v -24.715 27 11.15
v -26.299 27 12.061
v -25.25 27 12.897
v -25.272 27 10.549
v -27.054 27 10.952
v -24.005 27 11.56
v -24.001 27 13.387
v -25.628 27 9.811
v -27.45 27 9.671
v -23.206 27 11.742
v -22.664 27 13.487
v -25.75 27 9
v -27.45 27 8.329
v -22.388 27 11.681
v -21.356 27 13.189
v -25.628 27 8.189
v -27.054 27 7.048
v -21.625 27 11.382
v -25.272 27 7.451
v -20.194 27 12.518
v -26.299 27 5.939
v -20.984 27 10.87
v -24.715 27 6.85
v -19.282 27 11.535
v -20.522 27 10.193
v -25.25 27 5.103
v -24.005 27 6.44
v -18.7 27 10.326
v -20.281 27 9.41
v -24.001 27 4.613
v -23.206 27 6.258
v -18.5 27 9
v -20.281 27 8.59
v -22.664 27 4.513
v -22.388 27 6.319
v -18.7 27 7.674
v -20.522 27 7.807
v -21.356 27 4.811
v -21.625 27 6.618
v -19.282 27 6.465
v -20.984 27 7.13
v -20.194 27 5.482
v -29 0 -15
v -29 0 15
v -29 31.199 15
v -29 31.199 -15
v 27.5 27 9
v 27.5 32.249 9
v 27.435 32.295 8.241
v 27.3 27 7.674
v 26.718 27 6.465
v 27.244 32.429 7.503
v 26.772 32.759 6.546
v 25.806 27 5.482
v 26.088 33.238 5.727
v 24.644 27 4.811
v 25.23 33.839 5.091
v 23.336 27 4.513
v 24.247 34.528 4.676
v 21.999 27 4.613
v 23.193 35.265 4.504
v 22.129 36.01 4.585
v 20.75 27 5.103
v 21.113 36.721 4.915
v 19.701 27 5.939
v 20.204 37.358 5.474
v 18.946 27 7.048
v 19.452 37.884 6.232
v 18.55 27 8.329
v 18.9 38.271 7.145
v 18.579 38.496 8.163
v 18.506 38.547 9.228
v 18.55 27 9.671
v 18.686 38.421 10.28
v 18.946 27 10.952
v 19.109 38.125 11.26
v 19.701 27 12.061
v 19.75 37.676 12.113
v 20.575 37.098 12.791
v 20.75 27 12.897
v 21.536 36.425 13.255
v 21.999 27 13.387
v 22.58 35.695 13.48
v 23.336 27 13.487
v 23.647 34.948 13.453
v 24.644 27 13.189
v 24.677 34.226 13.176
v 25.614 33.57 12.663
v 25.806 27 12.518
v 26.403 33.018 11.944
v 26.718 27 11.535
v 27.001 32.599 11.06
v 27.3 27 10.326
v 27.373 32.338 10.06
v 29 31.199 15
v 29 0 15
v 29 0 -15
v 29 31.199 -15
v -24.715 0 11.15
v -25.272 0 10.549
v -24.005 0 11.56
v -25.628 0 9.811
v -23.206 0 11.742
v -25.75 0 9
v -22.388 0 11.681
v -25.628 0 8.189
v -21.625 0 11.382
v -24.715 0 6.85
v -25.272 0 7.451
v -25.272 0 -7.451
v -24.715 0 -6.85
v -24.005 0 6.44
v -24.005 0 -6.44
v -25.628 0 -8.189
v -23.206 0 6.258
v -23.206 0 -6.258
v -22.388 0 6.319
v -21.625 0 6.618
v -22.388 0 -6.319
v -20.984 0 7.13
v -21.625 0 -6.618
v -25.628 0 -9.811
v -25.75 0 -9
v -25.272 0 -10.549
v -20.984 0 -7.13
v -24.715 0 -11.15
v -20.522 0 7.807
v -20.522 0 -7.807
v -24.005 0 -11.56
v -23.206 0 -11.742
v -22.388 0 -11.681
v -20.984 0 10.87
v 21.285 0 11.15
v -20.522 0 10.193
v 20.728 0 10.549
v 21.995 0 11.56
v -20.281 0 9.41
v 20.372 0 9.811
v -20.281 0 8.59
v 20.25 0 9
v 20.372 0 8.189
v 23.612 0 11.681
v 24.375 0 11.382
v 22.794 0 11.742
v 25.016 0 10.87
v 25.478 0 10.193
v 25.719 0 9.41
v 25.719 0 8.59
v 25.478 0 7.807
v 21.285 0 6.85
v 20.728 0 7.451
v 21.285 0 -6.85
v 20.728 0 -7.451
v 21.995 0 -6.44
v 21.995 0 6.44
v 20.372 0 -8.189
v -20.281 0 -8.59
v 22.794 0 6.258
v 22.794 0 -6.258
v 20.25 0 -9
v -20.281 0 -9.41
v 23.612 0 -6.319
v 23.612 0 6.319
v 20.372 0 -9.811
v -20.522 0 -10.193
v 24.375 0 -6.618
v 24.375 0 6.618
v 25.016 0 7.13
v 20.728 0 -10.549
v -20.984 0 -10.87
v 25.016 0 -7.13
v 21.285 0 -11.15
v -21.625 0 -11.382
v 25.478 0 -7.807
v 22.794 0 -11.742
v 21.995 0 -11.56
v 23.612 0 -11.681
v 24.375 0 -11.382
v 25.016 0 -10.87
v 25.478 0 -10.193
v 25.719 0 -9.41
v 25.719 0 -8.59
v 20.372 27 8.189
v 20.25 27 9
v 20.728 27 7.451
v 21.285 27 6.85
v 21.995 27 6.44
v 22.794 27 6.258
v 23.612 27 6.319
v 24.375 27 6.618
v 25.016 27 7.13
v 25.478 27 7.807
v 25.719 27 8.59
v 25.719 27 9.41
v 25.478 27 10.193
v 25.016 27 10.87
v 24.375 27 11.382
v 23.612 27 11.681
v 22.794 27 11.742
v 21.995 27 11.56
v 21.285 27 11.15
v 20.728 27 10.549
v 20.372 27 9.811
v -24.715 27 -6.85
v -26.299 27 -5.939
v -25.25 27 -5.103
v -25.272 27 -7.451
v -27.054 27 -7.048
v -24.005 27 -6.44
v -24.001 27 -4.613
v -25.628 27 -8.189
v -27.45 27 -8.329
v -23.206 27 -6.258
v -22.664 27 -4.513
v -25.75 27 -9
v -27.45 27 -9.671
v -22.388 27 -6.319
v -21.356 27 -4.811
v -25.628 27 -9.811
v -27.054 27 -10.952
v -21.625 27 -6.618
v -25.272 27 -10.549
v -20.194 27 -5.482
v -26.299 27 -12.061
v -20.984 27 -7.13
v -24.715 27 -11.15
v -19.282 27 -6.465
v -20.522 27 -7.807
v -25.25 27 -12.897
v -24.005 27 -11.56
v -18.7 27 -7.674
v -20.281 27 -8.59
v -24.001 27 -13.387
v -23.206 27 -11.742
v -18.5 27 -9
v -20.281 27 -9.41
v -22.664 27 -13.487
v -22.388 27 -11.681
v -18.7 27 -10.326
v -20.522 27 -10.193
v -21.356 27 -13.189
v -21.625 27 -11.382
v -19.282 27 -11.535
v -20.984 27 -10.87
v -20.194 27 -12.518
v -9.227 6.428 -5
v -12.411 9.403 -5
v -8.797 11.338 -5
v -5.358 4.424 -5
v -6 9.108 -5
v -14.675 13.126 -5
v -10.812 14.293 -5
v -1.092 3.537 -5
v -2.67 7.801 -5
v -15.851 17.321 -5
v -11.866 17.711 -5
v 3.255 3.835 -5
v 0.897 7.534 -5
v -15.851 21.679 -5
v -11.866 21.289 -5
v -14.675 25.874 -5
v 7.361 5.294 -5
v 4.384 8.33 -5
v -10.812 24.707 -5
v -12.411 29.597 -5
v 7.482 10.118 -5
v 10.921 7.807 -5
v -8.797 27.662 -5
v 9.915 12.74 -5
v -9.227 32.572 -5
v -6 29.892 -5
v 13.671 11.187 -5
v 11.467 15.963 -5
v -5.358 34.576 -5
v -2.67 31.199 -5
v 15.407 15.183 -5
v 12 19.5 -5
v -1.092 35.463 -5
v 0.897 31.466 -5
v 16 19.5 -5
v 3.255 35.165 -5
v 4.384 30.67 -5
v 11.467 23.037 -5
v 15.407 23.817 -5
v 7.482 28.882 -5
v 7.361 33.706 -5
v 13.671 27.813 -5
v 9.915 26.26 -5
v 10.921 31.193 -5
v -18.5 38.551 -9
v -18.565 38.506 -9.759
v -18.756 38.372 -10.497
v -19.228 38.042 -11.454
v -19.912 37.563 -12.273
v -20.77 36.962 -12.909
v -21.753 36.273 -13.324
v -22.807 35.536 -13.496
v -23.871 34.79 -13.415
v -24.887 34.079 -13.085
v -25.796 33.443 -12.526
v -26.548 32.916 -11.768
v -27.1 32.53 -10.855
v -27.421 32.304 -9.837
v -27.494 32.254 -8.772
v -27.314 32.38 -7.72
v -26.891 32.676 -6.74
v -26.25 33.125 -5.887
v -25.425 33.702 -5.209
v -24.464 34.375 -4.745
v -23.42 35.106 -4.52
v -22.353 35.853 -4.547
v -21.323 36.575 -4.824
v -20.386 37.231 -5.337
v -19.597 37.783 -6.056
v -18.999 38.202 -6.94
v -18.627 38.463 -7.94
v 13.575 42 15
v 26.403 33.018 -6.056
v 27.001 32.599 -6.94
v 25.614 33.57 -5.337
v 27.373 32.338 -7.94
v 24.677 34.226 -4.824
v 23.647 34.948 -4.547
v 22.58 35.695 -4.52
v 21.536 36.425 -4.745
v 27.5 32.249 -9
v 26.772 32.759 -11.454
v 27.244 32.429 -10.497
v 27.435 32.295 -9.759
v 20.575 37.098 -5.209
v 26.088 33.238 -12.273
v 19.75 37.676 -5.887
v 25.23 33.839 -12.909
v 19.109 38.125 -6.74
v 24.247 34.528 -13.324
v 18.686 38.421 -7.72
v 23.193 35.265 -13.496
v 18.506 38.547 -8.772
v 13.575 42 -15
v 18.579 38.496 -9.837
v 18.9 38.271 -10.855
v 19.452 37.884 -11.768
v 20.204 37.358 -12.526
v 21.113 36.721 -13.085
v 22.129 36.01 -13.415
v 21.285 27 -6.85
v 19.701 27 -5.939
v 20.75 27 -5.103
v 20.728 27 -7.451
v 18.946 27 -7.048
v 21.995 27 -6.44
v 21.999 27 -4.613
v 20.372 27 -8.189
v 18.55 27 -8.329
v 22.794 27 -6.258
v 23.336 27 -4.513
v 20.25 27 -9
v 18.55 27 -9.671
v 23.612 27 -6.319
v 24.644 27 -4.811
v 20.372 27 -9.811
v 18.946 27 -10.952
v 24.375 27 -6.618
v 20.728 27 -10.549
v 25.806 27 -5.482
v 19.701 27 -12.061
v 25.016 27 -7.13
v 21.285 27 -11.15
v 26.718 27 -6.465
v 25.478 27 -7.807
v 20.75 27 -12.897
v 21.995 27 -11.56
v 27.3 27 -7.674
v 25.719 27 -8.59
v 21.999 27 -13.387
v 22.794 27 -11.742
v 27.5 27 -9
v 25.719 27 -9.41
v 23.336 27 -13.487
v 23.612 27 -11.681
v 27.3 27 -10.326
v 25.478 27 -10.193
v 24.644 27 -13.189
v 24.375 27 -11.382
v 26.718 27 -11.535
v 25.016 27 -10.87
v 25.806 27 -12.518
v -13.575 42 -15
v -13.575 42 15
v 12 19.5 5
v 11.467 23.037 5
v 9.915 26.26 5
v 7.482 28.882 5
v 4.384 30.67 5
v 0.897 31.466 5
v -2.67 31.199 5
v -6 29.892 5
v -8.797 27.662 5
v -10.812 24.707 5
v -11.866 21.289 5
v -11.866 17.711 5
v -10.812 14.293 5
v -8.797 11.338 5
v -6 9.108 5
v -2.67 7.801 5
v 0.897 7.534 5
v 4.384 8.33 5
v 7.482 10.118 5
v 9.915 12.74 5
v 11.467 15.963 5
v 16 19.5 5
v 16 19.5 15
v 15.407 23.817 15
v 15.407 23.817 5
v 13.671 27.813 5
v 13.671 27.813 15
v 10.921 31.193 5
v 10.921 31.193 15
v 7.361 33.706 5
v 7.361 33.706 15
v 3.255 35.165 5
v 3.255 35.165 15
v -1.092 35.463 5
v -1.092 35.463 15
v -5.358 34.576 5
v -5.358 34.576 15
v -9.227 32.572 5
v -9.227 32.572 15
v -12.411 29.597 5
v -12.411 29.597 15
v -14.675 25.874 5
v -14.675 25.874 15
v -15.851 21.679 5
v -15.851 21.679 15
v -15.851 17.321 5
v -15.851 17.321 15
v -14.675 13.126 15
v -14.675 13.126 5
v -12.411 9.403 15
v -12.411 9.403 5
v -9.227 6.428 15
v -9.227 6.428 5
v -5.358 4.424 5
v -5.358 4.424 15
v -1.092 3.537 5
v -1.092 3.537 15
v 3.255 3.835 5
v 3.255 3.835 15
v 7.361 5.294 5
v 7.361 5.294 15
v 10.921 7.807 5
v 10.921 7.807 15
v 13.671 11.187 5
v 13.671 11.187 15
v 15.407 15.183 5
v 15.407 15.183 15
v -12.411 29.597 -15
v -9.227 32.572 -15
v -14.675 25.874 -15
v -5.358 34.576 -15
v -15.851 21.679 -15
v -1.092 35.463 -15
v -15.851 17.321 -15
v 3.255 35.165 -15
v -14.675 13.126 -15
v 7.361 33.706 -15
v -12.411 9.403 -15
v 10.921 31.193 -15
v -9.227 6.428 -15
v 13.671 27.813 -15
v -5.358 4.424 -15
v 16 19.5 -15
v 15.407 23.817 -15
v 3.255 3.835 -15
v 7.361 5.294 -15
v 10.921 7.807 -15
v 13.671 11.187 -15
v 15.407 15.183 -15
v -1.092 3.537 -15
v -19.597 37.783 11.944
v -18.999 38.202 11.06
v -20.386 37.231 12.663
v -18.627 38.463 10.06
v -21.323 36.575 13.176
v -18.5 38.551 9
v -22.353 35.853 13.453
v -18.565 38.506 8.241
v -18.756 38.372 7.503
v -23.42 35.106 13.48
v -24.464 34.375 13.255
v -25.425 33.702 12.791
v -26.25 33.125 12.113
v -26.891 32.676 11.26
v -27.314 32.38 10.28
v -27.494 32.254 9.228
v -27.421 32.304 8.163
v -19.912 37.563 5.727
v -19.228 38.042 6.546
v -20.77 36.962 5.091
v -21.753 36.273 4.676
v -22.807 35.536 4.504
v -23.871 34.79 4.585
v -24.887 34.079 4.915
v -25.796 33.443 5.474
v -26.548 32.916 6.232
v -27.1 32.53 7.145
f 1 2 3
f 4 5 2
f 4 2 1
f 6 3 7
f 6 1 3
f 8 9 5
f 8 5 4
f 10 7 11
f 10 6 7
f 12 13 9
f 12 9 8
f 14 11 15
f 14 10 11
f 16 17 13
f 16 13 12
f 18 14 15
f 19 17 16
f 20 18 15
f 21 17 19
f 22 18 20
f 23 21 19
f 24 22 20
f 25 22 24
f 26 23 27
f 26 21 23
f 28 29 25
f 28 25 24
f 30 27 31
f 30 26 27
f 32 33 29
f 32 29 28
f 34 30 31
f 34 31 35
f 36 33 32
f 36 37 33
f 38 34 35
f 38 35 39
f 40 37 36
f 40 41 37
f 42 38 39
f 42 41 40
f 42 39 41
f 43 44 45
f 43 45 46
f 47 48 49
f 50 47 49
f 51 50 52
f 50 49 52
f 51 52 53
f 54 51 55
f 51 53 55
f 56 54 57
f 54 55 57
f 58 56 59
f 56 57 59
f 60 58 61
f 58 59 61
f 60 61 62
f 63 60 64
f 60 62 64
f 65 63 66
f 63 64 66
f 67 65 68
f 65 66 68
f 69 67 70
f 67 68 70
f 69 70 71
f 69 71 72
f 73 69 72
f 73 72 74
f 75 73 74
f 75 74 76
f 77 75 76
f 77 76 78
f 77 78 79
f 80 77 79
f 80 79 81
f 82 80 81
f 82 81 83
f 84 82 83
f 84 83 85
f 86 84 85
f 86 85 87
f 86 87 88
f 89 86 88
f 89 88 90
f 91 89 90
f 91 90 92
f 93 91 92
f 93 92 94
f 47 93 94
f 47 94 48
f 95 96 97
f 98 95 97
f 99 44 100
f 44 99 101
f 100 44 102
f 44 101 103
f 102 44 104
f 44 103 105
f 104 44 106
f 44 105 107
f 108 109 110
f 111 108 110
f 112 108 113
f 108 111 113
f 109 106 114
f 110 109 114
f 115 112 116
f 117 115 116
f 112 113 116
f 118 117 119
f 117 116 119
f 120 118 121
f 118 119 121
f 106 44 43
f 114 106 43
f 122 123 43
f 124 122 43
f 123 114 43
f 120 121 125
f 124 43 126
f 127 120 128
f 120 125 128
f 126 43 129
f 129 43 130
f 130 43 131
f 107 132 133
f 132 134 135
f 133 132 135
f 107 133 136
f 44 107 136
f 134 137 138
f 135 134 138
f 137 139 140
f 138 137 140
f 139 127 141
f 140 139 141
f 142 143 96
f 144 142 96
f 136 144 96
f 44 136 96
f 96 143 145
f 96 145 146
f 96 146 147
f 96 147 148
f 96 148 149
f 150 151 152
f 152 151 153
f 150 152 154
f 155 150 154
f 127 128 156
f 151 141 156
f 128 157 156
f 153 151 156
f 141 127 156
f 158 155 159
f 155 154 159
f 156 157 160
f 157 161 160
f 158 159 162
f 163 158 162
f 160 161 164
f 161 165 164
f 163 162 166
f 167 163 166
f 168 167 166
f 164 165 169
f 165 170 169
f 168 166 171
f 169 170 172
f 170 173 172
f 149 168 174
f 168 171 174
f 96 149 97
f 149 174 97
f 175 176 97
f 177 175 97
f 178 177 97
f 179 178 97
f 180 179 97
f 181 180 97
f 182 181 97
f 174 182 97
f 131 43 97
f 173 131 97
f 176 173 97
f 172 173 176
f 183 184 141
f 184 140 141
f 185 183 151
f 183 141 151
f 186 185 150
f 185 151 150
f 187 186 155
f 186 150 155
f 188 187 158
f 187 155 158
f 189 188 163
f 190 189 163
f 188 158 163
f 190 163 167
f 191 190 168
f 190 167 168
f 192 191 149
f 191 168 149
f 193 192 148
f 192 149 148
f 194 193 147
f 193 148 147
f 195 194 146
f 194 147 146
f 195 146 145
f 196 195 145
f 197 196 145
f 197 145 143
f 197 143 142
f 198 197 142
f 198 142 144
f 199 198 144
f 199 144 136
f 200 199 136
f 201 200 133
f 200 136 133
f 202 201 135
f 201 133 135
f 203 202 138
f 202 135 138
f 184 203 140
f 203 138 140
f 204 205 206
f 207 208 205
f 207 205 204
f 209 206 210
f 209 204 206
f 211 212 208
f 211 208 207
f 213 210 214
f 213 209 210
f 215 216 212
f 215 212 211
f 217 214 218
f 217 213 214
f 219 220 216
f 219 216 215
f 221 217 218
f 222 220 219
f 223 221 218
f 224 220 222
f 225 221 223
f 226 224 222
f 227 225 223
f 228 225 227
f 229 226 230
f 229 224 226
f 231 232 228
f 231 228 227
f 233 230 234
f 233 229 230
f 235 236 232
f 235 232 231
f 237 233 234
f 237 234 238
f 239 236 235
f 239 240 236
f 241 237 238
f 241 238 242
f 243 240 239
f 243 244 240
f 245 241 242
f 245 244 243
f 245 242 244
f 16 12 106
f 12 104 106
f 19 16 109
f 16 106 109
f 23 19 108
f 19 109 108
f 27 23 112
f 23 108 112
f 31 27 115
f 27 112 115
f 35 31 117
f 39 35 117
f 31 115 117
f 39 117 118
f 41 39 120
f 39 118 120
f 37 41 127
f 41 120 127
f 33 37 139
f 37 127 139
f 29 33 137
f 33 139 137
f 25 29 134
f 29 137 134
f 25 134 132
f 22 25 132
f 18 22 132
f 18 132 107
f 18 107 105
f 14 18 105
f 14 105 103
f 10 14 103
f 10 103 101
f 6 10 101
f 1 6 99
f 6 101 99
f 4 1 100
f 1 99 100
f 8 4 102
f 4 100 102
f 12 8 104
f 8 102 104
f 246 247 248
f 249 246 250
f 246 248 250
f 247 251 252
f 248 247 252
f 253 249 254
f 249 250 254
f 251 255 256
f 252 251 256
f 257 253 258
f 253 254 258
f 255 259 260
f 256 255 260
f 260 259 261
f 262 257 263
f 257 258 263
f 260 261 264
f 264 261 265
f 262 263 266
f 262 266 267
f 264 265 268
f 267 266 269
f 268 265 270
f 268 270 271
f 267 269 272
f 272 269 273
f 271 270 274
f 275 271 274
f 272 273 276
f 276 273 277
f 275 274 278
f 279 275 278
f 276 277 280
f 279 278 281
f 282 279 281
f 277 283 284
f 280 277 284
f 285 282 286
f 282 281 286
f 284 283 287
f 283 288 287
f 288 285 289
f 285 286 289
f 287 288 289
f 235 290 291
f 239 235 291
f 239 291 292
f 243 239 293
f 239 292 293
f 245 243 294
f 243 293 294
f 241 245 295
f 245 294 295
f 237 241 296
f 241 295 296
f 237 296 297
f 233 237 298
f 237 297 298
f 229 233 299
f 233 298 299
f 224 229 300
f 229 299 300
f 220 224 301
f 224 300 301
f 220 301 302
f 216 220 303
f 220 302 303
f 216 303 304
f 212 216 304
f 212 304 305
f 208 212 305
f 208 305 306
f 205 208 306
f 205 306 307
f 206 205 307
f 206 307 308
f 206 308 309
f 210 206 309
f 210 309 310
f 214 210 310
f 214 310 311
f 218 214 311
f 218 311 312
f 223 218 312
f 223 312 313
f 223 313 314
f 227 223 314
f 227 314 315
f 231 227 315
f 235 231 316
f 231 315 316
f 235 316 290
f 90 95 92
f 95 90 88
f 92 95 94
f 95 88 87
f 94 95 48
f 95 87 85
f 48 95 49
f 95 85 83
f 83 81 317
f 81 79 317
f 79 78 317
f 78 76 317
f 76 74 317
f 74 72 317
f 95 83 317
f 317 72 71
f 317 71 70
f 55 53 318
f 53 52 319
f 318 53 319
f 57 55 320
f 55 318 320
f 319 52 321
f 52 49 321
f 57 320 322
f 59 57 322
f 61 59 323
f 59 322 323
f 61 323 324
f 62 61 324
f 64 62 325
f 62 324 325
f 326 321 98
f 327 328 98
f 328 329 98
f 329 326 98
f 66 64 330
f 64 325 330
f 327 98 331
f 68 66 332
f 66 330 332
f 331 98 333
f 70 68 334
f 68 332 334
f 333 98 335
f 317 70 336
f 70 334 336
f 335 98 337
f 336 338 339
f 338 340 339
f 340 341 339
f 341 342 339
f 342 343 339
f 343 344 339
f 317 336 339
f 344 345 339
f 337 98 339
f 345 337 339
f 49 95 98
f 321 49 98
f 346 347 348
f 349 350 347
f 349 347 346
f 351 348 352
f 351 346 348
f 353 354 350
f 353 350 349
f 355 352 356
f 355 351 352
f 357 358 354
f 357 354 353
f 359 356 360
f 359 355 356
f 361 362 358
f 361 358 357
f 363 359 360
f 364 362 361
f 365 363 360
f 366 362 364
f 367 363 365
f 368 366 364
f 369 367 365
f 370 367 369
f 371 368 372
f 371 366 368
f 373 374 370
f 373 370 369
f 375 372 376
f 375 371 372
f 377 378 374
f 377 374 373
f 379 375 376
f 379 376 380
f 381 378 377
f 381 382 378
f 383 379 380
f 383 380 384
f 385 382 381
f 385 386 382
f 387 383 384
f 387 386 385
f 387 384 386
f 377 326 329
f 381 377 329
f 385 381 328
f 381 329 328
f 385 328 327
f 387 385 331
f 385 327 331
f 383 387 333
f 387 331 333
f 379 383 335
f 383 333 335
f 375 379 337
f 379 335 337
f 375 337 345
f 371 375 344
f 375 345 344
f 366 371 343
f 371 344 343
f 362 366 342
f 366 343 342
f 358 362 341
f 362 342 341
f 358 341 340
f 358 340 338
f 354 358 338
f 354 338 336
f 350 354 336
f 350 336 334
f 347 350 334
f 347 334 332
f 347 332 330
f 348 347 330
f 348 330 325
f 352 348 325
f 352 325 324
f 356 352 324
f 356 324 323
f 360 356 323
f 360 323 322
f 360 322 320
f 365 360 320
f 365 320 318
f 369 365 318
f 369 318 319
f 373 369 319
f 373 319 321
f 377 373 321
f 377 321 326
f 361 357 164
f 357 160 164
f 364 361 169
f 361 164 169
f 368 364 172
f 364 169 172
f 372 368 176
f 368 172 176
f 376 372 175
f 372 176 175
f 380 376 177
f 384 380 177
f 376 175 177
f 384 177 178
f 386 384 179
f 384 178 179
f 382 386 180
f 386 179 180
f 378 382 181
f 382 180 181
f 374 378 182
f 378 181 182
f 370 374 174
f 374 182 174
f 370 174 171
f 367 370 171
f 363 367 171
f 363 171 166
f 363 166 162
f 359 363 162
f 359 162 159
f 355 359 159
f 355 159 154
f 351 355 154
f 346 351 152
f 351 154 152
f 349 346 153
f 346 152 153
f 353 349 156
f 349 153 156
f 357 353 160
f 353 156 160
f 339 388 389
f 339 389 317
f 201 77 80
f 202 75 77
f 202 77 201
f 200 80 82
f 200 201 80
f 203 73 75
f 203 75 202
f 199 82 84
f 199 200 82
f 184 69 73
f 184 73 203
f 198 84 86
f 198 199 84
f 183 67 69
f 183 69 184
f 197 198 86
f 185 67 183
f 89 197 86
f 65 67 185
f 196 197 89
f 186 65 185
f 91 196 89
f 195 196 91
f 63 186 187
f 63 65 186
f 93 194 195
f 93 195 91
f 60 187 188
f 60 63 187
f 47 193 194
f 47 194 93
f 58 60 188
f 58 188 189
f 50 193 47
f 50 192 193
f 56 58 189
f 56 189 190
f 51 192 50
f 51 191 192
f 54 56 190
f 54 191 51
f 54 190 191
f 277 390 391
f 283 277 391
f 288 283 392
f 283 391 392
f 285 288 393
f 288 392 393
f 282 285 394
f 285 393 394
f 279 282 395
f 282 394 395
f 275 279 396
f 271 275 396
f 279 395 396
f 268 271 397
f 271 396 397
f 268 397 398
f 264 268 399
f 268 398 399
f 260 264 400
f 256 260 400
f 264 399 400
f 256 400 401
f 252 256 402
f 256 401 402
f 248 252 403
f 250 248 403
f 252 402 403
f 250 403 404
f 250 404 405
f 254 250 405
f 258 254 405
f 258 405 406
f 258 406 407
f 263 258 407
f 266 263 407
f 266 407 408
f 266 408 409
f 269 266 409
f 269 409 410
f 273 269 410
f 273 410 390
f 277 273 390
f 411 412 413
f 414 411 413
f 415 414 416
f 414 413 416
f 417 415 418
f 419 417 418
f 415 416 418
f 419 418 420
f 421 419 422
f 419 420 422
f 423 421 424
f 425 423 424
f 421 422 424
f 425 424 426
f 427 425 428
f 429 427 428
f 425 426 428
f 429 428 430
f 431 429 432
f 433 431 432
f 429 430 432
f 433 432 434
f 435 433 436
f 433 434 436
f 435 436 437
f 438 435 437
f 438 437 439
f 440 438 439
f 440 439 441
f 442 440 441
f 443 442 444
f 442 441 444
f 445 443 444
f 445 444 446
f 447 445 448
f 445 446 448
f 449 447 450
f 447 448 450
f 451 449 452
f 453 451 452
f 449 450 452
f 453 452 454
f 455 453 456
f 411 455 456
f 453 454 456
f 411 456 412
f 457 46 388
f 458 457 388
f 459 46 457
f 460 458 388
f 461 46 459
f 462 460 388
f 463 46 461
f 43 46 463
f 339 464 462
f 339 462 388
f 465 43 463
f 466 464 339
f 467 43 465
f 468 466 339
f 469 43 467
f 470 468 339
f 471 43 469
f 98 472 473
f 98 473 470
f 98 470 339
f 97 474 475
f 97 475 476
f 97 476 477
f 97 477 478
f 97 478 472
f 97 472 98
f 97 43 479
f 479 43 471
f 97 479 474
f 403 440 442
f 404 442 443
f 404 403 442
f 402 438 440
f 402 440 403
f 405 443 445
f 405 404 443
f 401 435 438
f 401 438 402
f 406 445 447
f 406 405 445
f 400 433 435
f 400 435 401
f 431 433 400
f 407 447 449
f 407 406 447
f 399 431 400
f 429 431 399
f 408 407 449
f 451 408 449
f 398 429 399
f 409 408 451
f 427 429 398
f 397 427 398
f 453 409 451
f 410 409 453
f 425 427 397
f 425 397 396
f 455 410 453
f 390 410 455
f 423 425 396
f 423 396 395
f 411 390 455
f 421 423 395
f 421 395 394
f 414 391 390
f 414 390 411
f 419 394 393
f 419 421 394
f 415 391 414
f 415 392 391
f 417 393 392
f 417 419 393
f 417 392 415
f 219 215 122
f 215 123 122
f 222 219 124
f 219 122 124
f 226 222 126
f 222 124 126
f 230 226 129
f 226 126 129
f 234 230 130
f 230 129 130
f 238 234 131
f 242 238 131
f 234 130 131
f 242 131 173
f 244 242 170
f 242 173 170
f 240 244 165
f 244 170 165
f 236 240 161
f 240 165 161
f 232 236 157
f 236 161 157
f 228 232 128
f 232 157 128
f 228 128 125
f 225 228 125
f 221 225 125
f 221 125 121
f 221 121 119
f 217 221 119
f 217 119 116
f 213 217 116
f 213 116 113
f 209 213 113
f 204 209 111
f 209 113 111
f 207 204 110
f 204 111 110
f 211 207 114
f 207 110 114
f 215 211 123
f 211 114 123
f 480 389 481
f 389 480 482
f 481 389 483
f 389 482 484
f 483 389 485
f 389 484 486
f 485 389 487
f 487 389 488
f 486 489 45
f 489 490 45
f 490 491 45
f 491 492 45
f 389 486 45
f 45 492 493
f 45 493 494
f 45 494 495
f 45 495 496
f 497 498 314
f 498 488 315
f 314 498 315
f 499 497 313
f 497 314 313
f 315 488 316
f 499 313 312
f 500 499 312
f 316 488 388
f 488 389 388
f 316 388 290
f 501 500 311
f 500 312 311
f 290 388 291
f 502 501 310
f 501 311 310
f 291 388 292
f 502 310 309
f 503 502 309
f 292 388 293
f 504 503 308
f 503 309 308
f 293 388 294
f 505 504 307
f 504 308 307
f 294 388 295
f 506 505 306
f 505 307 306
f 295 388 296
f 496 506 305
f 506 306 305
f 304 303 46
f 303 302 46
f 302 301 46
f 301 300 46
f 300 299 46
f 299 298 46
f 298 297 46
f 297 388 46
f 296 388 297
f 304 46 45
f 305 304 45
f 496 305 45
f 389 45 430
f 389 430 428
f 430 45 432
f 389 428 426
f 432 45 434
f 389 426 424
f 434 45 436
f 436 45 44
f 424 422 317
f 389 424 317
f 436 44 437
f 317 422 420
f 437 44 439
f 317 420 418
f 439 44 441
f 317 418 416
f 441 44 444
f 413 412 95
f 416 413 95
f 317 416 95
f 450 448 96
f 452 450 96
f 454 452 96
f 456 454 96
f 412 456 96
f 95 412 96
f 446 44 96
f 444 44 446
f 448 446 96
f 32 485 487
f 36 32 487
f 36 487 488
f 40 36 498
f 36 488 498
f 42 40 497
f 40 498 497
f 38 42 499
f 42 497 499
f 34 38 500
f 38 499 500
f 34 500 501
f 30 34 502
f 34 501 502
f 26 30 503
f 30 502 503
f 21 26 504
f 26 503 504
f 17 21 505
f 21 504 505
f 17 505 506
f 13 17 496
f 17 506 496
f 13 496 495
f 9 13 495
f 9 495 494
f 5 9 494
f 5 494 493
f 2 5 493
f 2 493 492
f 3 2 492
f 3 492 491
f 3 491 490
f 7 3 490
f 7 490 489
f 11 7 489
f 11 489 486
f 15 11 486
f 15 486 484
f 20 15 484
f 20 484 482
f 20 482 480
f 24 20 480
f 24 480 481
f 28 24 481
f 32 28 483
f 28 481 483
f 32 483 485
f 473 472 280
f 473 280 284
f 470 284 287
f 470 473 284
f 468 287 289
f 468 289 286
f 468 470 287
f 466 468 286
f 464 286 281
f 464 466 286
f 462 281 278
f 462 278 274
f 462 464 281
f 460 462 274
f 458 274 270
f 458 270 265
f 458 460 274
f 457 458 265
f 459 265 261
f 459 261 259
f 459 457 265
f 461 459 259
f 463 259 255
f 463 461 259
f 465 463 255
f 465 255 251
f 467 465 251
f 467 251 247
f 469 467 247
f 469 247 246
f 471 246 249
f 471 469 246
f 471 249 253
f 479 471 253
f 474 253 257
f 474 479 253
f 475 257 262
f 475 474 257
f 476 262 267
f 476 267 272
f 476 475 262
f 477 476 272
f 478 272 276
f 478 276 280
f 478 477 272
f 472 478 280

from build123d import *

# Parameters (mm, degrees)
SZKIC1_W                                             = 58
SZKIC1_H                                             = 30
DODANIE_WYCI_GNI_CIE1_DEPTH                          = 42
SZKIC3_R                                             = 12
WYTNIJ_WYCI_GNI_CIE2_DEPTH                           = 60.203040462
SZKIC4_R                                             = 16
WYTNIJ_WYCI_GNI_CIE3_DEPTH                           = 10
POG_BIENIE_WALCOWE_POD_M5_WKR_T_DO_CZ_CI_D           = 5.5
POG_BIENIE_WALCOWE_POD_M5_WKR_T_DO_CZ_CI_CBORE_D     = 9
POG_BIENIE_WALCOWE_POD_M5_WKR_T_DO_CZ_CI_CBORE_DEPTH = 15
WYTNIJ_WYCI_GNI_CIE4_DEPTH                           = 60.203040462


with BuildPart() as part:
    # Szkic1 → Dodanie-wyciągnięcie1 (new body)
    with BuildSketch(Plane(origin=(0, 0, 0), x_dir=(1, 0, 0), z_dir=(0, 1, 0))):
        Rectangle(SZKIC1_W, SZKIC1_H)
    extrude(amount=DODANIE_WYCI_GNI_CIE1_DEPTH)

    # Szkic3 → Wytnij-wyciągnięcie2 (cut, through all)
    with BuildSketch(Plane.XY.offset(15)):
        with Locations((0, 19.5)):
            Circle(SZKIC3_R)
    extrude(amount=-WYTNIJ_WYCI_GNI_CIE2_DEPTH, mode=Mode.SUBTRACT)

    # Szkic4 → Wytnij-wyciągnięcie3 (cut)
    with BuildSketch(Plane.XY.offset(15)):
        with Locations((0, 19.5)):
            Circle(SZKIC4_R)
    wytnij_wyci_gni_cie3 = extrude(amount=-WYTNIJ_WYCI_GNI_CIE3_DEPTH, mode=Mode.SUBTRACT)

    # Lustro1: Wytnij-wyciągnięcie3 across plane
    add(wytnij_wyci_gni_cie3.mirror(Plane.XY), mode=Mode.SUBTRACT)

    # Pogłębienie walcowe pod M5 Wkręt do części metalowych z łbem sześciokątnym1 (through all)
    with Locations(Plane(origin=(0, 42, 0), x_dir=(1, 0, 0), z_dir=(0, 1, 0))):
        with Locations((-23, -9), (-23, 9), (23, -9), (23, 9)):
            CounterBoreHole(POG_BIENIE_WALCOWE_POD_M5_WKR_T_DO_CZ_CI_D / 2, POG_BIENIE_WALCOWE_POD_M5_WKR_T_DO_CZ_CI_CBORE_D / 2, POG_BIENIE_WALCOWE_POD_M5_WKR_T_DO_CZ_CI_CBORE_DEPTH)

    # Szkic10 → Wytnij-wyciągnięcie4 (cut, through all)
    with BuildSketch(Plane(origin=(0, 0, -15), x_dir=(-1, 0, 0), z_dir=(0, 0, -1))):
        Polygon((-29, 31.199169847), (-13.574815946, 42), (-29, 42), align=None)
        Polygon((13.574815946, 42), (29, 31.199169847), (29, 42), align=None)
    extrude(amount=-WYTNIJ_WYCI_GNI_CIE4_DEPTH, mode=Mode.SUBTRACT)


solid = part.part
